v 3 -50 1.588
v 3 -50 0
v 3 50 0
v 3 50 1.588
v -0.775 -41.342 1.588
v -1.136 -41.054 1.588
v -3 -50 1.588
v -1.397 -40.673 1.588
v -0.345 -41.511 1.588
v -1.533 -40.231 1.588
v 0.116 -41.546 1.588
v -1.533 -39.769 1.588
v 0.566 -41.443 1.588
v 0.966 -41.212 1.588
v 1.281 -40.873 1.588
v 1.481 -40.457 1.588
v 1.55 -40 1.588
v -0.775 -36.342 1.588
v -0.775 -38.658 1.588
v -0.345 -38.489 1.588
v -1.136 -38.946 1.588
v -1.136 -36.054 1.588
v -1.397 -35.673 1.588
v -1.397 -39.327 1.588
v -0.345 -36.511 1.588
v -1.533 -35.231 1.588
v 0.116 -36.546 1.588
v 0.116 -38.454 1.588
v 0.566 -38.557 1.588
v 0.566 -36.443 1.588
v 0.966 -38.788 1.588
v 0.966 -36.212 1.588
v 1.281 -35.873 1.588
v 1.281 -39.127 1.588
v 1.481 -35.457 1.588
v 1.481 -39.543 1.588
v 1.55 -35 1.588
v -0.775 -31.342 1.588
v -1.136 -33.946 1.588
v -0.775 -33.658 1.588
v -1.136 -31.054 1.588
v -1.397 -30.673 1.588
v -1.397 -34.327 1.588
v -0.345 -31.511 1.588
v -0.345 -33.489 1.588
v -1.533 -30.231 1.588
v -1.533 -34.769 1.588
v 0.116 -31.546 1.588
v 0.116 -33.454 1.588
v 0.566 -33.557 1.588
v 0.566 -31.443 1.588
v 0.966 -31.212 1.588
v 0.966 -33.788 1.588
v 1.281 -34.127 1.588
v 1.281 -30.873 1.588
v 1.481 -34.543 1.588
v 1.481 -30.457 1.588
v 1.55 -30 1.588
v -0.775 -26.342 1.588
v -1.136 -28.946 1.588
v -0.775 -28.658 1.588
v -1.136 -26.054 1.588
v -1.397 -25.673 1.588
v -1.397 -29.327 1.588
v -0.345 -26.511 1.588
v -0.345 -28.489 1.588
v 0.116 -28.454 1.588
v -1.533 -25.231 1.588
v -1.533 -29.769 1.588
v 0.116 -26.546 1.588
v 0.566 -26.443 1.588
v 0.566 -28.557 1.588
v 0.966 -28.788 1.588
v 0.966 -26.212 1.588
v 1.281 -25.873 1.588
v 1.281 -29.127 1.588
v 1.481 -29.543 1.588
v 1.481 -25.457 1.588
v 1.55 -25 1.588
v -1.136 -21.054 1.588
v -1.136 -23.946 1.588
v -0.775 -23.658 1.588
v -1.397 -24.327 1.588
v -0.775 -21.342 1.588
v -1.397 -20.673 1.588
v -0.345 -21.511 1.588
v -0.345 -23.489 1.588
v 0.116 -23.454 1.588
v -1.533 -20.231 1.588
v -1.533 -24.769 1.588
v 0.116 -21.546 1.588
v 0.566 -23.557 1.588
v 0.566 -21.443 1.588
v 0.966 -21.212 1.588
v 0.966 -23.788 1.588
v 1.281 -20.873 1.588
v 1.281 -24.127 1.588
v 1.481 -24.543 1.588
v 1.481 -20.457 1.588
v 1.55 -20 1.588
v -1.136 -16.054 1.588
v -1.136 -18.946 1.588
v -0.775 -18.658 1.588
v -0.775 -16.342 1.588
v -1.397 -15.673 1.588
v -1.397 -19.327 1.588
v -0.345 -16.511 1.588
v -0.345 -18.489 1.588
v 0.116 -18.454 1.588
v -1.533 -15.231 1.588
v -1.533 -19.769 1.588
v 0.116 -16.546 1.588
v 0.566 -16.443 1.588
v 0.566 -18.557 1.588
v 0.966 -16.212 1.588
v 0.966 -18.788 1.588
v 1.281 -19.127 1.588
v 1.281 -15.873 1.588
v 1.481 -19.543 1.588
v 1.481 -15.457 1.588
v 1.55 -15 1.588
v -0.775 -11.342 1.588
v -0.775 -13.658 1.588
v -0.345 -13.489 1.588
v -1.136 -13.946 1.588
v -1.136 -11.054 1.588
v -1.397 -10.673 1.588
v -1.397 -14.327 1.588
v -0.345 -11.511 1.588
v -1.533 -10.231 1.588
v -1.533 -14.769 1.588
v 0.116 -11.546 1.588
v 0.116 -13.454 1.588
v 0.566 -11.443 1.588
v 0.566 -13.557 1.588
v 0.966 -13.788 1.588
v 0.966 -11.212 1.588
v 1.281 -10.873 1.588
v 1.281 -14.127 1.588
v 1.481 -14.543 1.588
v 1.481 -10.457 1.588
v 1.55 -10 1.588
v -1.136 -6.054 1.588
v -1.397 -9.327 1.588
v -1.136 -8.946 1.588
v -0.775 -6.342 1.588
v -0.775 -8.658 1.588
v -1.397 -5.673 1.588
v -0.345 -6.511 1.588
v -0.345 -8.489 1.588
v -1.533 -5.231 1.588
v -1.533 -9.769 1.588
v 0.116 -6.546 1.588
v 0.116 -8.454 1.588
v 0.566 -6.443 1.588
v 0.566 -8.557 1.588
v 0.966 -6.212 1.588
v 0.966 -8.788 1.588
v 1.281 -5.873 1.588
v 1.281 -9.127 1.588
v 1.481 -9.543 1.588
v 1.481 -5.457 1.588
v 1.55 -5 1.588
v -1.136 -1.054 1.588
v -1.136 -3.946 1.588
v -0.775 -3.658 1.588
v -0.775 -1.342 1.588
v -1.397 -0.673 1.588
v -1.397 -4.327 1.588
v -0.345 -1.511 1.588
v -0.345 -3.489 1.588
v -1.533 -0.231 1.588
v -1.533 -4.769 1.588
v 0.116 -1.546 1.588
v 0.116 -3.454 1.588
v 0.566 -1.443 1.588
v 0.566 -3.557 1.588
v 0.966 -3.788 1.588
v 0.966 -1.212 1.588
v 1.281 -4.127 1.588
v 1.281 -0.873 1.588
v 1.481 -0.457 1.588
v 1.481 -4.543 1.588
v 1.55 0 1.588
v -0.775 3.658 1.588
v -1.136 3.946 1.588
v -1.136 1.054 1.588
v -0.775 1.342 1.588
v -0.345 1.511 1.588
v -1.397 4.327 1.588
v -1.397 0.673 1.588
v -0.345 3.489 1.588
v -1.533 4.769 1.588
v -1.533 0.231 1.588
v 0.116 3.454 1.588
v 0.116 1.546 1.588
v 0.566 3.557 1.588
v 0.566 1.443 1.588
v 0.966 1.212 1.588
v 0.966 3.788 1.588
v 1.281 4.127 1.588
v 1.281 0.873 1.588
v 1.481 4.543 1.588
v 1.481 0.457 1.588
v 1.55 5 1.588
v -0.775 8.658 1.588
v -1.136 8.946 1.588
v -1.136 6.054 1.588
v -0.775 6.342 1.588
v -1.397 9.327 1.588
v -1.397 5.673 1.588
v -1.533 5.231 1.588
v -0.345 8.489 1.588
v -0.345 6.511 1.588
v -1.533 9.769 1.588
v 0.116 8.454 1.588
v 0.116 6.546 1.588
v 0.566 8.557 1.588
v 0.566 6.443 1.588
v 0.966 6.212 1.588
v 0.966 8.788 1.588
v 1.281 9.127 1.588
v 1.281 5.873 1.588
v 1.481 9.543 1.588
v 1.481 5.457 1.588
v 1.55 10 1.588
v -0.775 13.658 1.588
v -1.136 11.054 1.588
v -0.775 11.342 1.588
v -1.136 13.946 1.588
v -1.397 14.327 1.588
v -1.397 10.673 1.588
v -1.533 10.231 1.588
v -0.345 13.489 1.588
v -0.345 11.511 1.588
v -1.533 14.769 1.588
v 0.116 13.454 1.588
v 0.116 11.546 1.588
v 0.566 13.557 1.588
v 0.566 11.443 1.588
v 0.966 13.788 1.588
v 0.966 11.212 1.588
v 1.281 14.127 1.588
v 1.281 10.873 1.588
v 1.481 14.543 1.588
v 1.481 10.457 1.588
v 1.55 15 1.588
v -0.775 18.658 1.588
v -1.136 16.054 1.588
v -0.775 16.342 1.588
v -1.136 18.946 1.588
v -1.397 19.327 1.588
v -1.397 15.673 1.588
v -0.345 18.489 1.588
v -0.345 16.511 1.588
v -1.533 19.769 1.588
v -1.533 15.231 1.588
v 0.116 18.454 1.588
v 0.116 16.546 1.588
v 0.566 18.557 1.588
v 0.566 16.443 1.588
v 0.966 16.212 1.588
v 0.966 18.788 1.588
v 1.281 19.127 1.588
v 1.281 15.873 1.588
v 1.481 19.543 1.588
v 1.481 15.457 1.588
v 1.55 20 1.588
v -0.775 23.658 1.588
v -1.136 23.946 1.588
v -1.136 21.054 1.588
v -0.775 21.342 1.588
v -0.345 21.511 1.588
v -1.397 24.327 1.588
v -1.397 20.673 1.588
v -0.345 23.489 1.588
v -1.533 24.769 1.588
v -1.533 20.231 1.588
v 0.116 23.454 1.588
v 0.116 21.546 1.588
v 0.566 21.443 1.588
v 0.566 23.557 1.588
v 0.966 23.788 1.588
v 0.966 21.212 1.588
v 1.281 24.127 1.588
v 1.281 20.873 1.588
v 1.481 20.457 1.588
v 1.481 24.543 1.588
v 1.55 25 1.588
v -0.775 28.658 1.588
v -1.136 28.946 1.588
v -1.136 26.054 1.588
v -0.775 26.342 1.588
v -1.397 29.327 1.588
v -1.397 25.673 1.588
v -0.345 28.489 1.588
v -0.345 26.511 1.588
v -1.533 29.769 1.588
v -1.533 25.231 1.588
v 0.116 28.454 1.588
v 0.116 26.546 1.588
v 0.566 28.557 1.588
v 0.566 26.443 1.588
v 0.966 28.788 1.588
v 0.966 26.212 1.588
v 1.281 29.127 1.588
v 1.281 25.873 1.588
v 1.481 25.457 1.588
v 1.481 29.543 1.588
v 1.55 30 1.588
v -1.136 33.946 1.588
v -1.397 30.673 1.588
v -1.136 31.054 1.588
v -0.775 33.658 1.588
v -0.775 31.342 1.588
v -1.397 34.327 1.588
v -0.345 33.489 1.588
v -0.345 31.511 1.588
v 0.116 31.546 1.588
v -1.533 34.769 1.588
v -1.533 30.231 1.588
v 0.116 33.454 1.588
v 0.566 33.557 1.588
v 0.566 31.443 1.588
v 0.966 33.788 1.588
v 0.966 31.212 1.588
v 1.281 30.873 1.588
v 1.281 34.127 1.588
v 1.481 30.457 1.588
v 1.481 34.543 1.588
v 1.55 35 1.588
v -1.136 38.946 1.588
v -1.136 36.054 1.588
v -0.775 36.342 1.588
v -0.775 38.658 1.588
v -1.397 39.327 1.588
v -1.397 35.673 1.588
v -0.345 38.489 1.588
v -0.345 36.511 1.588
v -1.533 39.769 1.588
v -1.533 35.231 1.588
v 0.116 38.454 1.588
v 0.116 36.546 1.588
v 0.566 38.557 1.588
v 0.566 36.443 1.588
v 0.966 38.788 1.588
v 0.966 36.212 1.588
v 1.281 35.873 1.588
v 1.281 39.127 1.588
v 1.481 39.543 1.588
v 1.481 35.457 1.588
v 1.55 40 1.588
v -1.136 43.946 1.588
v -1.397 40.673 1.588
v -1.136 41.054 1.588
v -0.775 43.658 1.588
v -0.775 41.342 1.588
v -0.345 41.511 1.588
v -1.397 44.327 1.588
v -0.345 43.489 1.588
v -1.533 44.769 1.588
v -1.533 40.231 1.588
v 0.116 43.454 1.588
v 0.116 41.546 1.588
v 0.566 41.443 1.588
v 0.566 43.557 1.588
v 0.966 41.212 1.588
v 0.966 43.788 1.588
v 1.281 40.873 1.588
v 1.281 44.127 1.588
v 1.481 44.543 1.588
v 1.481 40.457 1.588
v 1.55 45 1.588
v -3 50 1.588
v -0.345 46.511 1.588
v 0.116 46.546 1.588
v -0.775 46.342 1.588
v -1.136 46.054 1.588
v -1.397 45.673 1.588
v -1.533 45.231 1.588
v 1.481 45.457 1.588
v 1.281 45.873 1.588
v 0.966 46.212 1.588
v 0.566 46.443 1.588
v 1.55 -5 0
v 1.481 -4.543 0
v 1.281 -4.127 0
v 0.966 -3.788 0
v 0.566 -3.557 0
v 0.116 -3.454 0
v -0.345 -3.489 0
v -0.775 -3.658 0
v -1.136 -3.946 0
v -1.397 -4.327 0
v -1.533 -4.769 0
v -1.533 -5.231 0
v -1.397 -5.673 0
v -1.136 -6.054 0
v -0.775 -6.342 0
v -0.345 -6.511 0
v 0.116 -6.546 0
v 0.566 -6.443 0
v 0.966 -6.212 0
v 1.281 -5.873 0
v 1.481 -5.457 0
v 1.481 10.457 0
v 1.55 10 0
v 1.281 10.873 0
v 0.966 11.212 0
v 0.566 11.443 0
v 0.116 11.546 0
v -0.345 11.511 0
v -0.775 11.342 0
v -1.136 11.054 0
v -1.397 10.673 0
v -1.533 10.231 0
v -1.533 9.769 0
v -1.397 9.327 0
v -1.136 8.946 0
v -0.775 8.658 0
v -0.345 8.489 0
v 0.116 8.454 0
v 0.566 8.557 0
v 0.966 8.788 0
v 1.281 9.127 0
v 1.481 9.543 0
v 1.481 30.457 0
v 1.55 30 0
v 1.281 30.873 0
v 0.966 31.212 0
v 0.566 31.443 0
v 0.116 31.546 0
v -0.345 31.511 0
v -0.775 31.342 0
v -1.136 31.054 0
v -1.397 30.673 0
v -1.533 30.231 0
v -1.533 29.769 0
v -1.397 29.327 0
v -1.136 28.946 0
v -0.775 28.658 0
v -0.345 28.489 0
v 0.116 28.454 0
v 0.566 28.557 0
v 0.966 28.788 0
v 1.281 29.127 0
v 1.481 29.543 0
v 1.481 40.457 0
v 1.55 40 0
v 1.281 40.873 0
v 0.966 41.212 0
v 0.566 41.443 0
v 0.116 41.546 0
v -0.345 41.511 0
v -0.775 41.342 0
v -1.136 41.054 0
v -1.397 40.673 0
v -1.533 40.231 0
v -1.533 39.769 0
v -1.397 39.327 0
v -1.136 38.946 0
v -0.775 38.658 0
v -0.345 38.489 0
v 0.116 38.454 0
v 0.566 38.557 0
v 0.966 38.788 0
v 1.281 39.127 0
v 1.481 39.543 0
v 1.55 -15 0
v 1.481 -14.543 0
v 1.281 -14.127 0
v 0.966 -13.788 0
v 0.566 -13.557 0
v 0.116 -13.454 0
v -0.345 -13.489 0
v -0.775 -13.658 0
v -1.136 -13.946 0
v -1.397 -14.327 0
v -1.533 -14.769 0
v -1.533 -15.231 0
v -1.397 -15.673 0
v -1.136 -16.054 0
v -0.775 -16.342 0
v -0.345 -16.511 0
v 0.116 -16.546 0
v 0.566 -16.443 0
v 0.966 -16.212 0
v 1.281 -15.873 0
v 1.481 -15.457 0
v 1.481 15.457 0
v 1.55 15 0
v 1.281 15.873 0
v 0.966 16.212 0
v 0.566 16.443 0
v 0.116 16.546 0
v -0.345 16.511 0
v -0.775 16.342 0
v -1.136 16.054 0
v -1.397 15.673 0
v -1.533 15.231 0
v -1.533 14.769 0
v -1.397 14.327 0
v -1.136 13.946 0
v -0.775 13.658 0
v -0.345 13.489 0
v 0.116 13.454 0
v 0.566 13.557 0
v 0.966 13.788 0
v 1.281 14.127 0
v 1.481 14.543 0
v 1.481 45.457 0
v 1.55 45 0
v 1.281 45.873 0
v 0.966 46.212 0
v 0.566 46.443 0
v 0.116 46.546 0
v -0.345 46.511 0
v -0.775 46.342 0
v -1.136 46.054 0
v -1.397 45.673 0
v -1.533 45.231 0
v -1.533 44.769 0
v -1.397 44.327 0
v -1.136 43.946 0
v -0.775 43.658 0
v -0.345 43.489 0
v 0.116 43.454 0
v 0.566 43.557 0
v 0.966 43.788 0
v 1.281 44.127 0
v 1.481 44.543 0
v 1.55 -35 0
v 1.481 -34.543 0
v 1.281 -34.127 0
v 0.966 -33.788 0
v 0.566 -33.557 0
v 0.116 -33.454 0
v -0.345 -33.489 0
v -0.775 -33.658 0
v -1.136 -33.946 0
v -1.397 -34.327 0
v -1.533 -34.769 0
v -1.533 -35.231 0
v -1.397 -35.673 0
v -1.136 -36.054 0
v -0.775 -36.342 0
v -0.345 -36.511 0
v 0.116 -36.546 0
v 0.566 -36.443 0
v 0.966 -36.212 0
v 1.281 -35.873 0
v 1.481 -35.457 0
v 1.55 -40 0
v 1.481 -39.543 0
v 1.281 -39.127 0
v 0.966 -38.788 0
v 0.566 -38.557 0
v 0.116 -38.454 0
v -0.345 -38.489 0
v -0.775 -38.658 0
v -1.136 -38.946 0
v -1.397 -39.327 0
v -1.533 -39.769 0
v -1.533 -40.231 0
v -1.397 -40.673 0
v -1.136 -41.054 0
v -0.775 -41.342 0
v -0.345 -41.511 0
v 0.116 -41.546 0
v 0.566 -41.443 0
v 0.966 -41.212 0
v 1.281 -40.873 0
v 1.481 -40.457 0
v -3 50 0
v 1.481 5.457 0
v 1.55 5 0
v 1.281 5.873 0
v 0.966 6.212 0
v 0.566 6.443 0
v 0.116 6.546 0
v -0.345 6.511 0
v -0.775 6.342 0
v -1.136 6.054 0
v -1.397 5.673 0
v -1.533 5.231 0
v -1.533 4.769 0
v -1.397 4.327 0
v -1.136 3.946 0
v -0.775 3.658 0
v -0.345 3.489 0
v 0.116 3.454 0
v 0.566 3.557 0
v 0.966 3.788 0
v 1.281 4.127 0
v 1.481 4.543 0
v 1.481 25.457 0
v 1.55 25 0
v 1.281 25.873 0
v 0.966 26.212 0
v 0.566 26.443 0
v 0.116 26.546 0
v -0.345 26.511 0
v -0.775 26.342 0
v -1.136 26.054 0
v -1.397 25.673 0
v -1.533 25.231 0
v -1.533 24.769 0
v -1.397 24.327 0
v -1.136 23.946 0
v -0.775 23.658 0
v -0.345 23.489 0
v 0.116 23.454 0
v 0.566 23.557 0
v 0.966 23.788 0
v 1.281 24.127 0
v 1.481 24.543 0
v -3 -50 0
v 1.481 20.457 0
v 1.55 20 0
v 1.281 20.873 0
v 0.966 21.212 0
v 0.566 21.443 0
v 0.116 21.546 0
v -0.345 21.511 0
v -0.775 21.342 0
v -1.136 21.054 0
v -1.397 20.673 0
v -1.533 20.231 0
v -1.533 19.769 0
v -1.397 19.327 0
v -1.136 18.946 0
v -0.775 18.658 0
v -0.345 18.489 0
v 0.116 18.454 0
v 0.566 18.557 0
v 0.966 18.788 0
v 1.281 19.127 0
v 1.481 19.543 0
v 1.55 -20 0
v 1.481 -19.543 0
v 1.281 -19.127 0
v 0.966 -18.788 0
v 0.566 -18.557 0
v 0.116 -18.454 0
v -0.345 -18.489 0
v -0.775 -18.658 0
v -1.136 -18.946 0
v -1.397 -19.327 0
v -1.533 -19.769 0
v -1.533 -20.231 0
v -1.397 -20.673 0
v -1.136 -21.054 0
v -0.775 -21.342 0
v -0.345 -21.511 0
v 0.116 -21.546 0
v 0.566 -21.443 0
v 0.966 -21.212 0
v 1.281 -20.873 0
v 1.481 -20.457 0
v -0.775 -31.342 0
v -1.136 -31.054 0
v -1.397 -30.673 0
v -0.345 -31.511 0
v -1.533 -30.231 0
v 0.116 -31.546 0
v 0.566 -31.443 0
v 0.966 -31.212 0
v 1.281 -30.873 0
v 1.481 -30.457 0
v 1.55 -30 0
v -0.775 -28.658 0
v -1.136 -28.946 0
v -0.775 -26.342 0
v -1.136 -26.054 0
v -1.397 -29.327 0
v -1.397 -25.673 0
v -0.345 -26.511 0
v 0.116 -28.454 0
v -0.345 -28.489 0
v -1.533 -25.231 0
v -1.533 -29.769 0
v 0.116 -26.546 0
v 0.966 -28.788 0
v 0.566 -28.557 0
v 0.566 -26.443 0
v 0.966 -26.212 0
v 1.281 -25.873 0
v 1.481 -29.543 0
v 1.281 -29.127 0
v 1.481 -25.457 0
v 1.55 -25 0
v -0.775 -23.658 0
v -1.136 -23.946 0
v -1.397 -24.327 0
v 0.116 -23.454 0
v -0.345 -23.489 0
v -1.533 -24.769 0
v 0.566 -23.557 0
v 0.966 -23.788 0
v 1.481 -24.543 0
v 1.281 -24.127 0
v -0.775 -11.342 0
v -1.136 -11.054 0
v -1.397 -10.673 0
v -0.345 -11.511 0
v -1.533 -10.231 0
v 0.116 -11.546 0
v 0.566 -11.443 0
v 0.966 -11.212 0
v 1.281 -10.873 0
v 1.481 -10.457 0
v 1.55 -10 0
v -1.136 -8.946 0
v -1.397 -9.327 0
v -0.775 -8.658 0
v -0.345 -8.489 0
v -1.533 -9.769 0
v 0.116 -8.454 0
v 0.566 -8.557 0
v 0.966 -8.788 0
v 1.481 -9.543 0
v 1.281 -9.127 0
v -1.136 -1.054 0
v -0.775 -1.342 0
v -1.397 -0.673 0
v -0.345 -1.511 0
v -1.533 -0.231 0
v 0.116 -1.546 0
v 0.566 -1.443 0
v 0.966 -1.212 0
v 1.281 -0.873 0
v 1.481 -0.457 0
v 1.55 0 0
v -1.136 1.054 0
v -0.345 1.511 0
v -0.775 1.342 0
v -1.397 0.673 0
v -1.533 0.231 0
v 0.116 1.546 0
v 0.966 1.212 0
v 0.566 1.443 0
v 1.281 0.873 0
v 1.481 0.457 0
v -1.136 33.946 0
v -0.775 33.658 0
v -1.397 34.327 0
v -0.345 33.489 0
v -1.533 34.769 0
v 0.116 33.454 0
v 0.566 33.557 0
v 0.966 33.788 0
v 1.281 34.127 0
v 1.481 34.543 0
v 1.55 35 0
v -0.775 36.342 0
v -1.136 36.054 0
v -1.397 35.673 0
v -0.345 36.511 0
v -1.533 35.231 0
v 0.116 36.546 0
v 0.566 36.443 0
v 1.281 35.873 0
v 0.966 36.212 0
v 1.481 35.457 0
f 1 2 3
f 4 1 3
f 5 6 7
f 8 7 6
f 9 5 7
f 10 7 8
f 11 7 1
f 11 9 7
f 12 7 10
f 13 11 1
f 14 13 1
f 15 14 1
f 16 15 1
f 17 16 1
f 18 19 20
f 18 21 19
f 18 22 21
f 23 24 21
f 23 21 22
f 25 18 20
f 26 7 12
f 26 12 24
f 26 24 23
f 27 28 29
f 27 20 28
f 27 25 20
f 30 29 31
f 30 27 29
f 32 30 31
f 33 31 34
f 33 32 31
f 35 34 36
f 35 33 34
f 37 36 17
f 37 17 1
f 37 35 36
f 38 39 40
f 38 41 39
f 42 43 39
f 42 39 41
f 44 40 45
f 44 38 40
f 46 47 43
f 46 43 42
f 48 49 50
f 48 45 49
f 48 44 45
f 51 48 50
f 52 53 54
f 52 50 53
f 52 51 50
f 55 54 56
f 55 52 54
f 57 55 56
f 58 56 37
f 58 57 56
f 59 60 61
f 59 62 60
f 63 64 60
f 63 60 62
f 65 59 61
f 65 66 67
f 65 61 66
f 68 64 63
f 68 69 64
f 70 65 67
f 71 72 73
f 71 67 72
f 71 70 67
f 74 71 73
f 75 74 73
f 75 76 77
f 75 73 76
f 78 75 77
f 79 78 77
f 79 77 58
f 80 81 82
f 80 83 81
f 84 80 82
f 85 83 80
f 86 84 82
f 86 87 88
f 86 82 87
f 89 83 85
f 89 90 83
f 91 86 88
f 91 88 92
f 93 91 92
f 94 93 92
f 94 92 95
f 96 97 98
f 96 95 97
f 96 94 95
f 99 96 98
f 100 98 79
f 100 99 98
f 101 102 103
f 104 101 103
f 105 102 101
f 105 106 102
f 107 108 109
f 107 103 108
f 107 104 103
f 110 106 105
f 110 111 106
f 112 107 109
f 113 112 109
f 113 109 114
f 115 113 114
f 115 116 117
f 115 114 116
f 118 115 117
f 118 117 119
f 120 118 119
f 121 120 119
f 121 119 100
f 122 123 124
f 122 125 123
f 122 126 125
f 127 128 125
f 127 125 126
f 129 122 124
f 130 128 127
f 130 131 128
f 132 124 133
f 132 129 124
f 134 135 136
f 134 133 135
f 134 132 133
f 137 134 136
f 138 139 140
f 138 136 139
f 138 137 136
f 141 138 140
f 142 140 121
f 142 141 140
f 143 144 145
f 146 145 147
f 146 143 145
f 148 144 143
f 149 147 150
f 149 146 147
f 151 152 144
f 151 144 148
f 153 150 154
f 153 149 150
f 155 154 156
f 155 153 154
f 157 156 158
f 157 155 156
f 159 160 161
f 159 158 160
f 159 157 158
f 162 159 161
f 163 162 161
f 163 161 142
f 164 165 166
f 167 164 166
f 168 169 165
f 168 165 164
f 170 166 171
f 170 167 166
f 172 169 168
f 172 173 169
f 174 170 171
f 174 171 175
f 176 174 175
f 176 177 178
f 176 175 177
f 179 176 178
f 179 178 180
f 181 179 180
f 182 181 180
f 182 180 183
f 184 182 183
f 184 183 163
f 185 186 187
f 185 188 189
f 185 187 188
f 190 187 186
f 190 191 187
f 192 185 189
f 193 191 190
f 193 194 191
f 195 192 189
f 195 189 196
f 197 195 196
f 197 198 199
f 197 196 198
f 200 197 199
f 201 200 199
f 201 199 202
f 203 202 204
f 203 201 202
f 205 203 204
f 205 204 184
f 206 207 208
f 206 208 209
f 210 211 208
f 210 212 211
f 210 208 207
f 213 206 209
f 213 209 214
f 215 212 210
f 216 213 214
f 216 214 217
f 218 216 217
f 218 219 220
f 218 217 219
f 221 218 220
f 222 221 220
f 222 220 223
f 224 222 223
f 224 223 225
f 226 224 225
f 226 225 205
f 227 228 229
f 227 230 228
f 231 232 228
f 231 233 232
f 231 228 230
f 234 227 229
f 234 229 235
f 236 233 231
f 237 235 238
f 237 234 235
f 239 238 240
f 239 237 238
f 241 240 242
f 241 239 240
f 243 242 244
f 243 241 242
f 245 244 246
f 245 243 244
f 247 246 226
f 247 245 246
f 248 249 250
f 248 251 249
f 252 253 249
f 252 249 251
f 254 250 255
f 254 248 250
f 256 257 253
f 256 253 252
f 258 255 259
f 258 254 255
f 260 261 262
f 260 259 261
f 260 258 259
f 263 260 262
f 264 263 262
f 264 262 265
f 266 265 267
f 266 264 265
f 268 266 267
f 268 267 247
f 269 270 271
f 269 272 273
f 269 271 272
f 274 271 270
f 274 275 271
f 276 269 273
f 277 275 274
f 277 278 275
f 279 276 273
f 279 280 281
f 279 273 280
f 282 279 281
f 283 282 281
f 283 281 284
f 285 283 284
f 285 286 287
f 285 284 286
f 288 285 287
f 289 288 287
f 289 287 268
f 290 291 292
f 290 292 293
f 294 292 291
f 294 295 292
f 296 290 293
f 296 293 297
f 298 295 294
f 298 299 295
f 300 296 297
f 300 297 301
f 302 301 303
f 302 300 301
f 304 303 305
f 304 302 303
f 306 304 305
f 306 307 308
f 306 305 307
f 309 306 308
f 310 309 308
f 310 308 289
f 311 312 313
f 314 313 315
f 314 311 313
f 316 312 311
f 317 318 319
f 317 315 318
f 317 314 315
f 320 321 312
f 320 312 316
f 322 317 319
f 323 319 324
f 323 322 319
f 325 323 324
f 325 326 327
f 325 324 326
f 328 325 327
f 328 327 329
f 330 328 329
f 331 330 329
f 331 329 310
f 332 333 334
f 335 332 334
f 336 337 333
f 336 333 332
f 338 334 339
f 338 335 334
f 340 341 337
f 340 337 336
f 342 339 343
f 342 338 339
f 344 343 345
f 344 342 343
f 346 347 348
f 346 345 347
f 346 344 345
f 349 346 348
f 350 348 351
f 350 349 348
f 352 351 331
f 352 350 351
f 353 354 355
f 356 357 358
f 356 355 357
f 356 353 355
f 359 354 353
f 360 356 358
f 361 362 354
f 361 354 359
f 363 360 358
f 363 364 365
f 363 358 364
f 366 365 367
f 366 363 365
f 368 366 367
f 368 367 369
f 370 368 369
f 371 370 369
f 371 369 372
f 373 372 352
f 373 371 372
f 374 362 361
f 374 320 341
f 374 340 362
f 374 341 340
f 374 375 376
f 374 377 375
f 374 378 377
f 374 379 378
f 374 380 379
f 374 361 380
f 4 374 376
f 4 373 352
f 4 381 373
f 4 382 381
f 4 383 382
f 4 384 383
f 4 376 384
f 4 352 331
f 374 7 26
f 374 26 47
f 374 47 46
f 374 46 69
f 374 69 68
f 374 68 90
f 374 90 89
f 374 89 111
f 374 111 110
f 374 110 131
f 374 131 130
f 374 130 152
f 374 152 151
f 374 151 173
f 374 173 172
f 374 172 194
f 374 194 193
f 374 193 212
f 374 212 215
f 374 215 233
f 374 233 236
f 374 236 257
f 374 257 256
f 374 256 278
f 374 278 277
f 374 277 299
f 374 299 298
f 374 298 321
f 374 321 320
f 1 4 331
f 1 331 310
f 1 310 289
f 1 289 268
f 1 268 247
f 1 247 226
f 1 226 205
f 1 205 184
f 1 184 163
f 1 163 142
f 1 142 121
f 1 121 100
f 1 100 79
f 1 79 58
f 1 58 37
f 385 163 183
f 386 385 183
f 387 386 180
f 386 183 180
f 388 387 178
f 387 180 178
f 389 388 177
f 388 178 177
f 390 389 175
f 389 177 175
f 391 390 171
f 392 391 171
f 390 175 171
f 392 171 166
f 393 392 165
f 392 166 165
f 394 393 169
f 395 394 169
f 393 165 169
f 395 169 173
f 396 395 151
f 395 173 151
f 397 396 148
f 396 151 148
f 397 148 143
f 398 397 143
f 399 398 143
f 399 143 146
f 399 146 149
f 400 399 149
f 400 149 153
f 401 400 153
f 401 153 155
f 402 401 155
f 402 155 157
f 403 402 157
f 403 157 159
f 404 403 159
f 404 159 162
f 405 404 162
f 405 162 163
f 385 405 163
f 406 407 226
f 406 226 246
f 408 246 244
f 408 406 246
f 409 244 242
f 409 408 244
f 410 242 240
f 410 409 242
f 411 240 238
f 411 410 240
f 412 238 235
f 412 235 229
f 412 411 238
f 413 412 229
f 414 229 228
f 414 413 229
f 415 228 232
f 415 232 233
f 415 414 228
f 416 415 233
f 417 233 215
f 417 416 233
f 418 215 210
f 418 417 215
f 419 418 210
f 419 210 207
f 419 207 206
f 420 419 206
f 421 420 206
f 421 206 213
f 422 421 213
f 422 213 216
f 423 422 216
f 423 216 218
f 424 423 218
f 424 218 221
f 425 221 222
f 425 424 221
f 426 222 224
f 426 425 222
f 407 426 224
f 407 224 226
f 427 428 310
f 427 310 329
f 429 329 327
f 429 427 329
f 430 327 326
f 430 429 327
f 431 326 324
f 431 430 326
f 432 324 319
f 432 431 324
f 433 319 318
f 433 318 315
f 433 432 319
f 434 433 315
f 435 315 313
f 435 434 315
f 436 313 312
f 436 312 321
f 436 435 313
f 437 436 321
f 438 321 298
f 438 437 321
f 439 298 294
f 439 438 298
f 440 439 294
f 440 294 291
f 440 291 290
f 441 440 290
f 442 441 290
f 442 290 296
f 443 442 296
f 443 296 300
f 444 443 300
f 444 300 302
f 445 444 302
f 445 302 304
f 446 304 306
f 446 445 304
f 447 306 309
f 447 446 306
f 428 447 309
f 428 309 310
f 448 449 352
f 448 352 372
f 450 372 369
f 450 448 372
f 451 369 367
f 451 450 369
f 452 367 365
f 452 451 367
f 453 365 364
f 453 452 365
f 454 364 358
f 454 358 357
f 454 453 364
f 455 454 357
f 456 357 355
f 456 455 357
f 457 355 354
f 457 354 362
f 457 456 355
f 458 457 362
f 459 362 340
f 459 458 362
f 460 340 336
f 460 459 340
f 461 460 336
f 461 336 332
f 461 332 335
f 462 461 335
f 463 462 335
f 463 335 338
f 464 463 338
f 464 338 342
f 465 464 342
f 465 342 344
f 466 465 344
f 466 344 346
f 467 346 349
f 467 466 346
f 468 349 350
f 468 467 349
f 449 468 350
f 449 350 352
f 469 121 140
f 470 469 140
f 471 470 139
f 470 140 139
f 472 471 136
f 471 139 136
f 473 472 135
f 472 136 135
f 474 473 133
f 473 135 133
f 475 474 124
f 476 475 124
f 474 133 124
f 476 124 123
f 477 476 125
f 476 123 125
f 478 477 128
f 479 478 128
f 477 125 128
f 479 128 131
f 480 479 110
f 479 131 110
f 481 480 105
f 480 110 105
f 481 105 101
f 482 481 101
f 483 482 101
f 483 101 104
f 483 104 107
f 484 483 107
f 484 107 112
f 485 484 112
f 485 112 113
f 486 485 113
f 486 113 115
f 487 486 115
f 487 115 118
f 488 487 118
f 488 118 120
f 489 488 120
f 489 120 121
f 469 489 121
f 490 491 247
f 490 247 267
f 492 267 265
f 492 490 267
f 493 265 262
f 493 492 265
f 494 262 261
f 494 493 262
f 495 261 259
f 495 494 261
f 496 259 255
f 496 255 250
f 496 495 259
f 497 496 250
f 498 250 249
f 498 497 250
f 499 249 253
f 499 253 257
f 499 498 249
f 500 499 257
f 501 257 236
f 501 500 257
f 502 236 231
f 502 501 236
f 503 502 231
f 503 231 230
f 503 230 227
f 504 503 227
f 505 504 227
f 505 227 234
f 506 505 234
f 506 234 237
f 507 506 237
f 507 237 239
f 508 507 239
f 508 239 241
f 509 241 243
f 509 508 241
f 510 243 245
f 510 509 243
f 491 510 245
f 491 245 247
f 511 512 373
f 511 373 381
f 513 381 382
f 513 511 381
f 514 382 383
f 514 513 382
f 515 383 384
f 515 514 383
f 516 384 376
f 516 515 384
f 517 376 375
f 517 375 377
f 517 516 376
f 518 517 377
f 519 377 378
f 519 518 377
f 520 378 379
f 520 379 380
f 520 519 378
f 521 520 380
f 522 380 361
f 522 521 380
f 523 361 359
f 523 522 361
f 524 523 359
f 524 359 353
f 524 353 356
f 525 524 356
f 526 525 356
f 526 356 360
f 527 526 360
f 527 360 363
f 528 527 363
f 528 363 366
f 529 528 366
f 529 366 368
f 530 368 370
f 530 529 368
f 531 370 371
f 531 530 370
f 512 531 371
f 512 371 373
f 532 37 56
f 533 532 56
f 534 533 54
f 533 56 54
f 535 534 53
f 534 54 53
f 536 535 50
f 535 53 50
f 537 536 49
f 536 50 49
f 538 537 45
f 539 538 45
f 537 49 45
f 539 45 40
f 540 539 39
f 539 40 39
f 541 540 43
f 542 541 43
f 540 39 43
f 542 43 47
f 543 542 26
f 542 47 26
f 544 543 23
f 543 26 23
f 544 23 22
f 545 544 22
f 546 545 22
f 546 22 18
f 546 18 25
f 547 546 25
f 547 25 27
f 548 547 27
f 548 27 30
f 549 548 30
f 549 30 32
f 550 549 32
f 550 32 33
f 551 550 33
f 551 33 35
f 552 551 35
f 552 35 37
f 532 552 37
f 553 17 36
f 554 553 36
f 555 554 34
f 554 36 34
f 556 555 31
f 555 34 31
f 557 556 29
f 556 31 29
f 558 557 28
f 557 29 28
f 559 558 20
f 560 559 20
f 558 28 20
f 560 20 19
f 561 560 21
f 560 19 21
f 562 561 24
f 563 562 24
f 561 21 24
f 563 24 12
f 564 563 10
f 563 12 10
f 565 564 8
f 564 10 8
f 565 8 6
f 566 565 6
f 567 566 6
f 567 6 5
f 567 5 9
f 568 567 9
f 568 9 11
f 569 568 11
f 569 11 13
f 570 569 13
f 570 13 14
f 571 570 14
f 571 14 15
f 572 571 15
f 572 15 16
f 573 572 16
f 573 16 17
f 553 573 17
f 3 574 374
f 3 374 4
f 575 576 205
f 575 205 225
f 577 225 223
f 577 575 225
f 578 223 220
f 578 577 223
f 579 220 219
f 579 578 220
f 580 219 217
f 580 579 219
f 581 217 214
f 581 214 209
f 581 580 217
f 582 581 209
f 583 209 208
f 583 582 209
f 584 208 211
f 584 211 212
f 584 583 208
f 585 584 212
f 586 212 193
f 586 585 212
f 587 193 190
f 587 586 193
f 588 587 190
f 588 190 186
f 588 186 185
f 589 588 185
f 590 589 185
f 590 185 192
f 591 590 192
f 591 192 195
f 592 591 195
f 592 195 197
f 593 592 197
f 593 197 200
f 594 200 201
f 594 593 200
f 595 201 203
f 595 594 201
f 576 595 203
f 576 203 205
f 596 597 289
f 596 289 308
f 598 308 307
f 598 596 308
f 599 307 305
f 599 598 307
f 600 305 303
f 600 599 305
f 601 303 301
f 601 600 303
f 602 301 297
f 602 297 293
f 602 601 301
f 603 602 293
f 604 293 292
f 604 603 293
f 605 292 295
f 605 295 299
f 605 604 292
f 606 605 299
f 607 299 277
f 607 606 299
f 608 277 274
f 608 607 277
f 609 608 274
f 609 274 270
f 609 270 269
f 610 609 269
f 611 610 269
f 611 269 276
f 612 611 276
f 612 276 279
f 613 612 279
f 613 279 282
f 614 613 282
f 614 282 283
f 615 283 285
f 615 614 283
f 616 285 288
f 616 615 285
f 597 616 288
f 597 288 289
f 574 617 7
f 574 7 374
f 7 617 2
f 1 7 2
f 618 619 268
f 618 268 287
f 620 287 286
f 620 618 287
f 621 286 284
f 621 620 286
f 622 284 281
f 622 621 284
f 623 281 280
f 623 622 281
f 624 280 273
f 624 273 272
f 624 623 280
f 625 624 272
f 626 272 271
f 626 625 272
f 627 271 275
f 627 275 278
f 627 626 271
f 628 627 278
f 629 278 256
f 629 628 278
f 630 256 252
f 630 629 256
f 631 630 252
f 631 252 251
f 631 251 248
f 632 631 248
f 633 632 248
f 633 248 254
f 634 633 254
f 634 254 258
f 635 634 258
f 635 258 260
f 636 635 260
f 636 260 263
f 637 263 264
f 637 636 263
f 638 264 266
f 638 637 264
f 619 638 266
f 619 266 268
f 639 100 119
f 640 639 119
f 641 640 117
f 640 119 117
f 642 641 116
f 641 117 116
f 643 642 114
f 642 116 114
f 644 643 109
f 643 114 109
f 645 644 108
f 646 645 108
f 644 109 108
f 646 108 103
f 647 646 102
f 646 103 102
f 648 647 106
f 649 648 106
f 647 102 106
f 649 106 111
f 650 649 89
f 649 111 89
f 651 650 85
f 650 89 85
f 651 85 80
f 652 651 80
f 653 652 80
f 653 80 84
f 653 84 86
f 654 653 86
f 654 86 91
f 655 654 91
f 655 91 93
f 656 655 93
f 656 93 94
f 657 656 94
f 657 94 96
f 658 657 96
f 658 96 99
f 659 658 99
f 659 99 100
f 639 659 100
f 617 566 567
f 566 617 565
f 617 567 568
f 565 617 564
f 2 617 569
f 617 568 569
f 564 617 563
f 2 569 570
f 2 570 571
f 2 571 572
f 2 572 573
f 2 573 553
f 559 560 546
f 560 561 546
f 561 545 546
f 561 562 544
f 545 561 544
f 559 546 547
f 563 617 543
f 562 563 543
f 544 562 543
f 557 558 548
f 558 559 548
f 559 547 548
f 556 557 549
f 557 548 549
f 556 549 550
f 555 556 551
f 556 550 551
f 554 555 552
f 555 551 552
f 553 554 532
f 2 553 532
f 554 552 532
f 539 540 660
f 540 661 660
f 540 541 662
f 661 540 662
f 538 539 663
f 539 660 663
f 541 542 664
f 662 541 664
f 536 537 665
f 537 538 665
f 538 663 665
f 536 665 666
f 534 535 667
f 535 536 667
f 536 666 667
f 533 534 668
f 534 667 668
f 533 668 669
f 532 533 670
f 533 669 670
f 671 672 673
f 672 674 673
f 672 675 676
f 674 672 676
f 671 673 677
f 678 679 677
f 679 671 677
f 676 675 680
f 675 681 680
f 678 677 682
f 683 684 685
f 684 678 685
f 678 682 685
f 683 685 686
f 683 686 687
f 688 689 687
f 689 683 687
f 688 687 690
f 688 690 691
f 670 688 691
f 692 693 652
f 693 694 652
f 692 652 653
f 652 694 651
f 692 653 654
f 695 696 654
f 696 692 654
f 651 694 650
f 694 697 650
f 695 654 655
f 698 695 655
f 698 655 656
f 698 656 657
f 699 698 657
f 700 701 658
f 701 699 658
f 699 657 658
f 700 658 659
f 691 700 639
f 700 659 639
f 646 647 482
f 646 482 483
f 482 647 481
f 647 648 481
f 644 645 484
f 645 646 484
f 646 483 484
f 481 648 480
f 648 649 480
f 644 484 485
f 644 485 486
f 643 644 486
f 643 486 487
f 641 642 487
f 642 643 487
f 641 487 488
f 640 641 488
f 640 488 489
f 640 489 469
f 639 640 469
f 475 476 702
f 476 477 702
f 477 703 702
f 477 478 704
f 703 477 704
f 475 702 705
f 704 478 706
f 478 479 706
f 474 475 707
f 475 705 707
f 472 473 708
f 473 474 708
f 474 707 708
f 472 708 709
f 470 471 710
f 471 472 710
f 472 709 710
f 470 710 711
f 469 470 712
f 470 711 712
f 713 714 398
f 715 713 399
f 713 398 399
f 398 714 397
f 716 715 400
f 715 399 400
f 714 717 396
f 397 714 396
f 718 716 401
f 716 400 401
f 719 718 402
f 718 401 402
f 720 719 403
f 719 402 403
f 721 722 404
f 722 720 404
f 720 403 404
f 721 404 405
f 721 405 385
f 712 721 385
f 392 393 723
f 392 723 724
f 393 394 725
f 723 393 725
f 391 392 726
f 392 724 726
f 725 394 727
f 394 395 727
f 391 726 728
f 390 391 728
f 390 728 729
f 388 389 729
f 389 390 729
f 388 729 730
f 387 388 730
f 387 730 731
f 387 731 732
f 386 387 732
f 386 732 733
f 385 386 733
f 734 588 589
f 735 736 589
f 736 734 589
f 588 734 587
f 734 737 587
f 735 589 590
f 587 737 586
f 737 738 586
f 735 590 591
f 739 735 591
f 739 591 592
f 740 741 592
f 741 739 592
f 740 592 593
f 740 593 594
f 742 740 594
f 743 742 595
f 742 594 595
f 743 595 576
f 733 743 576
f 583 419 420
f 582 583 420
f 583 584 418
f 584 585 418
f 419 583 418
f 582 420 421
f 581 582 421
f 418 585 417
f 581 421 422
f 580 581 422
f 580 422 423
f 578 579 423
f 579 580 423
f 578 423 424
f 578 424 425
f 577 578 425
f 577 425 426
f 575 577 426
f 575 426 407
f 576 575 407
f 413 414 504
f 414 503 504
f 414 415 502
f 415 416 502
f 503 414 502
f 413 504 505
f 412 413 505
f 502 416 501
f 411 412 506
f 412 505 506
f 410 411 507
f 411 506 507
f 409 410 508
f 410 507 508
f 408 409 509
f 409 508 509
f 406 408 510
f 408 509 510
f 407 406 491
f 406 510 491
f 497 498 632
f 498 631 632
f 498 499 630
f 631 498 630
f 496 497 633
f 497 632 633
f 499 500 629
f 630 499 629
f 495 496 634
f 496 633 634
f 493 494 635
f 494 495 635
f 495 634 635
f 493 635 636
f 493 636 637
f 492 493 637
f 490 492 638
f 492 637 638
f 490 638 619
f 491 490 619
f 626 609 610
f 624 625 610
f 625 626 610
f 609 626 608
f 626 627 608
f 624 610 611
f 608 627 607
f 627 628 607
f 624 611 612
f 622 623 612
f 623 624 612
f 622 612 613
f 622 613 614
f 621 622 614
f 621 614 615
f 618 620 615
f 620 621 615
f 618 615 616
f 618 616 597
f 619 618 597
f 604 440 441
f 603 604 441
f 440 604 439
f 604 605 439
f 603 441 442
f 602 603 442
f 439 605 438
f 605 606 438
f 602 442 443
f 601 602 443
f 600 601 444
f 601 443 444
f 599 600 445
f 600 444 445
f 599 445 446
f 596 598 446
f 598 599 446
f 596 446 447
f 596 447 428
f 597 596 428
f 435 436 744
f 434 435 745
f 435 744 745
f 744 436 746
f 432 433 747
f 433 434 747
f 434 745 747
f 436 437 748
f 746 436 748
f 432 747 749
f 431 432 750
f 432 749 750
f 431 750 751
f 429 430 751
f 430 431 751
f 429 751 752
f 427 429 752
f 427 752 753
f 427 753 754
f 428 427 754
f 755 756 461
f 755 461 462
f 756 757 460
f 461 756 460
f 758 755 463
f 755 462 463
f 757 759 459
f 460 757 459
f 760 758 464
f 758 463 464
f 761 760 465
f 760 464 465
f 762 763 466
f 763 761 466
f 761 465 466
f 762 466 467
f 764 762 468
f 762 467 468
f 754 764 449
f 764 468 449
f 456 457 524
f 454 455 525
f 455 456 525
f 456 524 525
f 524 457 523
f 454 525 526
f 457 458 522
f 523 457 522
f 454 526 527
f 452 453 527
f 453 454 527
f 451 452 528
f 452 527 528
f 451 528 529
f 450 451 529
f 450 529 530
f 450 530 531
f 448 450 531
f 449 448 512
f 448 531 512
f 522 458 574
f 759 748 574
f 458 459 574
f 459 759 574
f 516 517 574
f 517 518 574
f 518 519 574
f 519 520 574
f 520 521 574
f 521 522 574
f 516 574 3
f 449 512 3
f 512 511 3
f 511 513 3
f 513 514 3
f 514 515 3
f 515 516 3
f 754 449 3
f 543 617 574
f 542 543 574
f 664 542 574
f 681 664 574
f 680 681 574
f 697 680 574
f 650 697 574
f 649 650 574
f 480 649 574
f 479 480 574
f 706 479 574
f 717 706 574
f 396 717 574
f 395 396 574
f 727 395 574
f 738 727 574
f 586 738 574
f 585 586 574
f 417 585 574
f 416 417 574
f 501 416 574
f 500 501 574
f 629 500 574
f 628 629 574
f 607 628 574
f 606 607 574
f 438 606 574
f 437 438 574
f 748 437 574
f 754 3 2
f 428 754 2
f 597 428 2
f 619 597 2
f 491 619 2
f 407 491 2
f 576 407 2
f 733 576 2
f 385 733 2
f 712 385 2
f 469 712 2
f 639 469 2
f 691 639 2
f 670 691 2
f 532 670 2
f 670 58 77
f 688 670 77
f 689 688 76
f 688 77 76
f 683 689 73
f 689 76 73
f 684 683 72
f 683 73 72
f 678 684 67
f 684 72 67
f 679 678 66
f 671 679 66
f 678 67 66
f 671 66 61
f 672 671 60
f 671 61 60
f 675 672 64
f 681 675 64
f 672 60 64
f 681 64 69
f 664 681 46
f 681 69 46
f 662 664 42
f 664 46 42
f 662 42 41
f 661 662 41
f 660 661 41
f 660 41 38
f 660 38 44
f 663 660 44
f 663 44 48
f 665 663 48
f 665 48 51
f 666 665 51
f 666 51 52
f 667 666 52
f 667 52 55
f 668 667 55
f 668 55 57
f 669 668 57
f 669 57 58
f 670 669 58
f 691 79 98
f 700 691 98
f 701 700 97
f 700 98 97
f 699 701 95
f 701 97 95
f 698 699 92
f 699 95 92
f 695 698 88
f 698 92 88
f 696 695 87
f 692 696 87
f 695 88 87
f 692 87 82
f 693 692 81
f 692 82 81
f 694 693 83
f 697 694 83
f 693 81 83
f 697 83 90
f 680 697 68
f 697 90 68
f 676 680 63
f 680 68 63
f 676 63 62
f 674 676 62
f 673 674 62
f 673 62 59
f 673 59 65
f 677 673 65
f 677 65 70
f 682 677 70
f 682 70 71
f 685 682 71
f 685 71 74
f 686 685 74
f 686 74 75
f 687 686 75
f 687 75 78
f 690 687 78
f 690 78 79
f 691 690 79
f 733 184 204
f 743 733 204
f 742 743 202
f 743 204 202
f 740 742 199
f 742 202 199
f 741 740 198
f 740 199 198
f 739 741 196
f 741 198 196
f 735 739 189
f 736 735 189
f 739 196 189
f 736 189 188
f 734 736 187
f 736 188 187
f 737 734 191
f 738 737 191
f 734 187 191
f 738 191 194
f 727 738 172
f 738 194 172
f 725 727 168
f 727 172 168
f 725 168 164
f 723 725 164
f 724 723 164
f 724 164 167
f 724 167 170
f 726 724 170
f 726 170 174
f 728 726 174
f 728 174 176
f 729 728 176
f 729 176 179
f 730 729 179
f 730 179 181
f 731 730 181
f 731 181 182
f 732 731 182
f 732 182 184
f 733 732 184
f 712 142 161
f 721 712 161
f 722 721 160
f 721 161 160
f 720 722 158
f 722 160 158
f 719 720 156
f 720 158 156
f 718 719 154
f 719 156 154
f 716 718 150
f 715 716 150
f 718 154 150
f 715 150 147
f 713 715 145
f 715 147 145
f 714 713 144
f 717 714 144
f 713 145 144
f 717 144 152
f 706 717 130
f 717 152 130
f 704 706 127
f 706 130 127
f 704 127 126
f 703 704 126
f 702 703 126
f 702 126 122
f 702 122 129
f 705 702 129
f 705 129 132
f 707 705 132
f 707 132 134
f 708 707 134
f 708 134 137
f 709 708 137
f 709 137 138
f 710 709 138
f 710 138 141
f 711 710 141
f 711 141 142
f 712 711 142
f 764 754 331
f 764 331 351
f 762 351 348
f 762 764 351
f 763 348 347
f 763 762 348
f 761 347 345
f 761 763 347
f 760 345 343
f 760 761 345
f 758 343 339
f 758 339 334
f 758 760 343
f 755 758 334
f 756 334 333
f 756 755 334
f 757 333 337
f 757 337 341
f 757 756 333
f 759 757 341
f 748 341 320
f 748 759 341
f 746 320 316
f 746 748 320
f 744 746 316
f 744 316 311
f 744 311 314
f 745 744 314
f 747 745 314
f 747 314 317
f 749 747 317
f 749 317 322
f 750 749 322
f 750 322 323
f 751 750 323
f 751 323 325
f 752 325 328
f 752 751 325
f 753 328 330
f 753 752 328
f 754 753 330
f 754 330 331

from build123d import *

# Parameters (mm, degrees)
SKETCH1_W           = 6
SKETCH1_H           = 100
MAINBODY_DEPTH      = 1.5875
PEGHOLE_REACH       = 52.115
SKETCH2_R           = 1.55
LPATTERN1_COUNT     = 9
LPATTERN1_PITCH     = 5
LPATTERN2_OUTLINE_R = 1.55
LPATTERN2_DEPTH     = 1.5875


# Read off the part's stored shape, not the designer's step: LPattern2
with BuildPart() as part:
    # Sketch1 → MainBody (new body)
    with BuildSketch(Plane.XY):
        Rectangle(SKETCH1_W, SKETCH1_H)
    extrude(amount=MAINBODY_DEPTH)

    # Sketch2 → PegHole (cut, up to next)
    with BuildSketch(Plane.XY.offset(1.5875), mode=Mode.PRIVATE) as peghole_sk1:
        Circle(SKETCH2_R)
    peghole_tool1 = extrude(peghole_sk1.sketch, amount=-PEGHOLE_REACH, mode=Mode.PRIVATE) & part.part
    peghole = peghole_tool1.solids().sort_by_distance((0, 0, 1.5875))[0]
    add(peghole, mode=Mode.SUBTRACT)

    # LPattern1: PegHole ×9
    with Locations(*[(0, -i * LPATTERN1_PITCH, 0) for i in range(1, LPATTERN1_COUNT)]):
        add(peghole, mode=Mode.SUBTRACT)

    # LPattern2 outline → LPattern2 (cut)
    with BuildSketch(Plane.XY):
        with Locations((0, 5)):
            Circle(LPATTERN2_OUTLINE_R)
        with Locations((0, 10)):
            Circle(LPATTERN2_OUTLINE_R)
        with Locations((0, 15)):
            Circle(LPATTERN2_OUTLINE_R)
        with Locations((0, 20)):
            Circle(LPATTERN2_OUTLINE_R)
        with Locations((0, 25)):
            Circle(LPATTERN2_OUTLINE_R)
        with Locations((0, 30)):
            Circle(LPATTERN2_OUTLINE_R)
        with Locations((0, 35)):
            Circle(LPATTERN2_OUTLINE_R)
        with Locations((0, 40)):
            Circle(LPATTERN2_OUTLINE_R)
        with Locations((0, 45)):
            Circle(LPATTERN2_OUTLINE_R)
    extrude(amount=LPATTERN2_DEPTH, mode=Mode.SUBTRACT)


solid = part.part
